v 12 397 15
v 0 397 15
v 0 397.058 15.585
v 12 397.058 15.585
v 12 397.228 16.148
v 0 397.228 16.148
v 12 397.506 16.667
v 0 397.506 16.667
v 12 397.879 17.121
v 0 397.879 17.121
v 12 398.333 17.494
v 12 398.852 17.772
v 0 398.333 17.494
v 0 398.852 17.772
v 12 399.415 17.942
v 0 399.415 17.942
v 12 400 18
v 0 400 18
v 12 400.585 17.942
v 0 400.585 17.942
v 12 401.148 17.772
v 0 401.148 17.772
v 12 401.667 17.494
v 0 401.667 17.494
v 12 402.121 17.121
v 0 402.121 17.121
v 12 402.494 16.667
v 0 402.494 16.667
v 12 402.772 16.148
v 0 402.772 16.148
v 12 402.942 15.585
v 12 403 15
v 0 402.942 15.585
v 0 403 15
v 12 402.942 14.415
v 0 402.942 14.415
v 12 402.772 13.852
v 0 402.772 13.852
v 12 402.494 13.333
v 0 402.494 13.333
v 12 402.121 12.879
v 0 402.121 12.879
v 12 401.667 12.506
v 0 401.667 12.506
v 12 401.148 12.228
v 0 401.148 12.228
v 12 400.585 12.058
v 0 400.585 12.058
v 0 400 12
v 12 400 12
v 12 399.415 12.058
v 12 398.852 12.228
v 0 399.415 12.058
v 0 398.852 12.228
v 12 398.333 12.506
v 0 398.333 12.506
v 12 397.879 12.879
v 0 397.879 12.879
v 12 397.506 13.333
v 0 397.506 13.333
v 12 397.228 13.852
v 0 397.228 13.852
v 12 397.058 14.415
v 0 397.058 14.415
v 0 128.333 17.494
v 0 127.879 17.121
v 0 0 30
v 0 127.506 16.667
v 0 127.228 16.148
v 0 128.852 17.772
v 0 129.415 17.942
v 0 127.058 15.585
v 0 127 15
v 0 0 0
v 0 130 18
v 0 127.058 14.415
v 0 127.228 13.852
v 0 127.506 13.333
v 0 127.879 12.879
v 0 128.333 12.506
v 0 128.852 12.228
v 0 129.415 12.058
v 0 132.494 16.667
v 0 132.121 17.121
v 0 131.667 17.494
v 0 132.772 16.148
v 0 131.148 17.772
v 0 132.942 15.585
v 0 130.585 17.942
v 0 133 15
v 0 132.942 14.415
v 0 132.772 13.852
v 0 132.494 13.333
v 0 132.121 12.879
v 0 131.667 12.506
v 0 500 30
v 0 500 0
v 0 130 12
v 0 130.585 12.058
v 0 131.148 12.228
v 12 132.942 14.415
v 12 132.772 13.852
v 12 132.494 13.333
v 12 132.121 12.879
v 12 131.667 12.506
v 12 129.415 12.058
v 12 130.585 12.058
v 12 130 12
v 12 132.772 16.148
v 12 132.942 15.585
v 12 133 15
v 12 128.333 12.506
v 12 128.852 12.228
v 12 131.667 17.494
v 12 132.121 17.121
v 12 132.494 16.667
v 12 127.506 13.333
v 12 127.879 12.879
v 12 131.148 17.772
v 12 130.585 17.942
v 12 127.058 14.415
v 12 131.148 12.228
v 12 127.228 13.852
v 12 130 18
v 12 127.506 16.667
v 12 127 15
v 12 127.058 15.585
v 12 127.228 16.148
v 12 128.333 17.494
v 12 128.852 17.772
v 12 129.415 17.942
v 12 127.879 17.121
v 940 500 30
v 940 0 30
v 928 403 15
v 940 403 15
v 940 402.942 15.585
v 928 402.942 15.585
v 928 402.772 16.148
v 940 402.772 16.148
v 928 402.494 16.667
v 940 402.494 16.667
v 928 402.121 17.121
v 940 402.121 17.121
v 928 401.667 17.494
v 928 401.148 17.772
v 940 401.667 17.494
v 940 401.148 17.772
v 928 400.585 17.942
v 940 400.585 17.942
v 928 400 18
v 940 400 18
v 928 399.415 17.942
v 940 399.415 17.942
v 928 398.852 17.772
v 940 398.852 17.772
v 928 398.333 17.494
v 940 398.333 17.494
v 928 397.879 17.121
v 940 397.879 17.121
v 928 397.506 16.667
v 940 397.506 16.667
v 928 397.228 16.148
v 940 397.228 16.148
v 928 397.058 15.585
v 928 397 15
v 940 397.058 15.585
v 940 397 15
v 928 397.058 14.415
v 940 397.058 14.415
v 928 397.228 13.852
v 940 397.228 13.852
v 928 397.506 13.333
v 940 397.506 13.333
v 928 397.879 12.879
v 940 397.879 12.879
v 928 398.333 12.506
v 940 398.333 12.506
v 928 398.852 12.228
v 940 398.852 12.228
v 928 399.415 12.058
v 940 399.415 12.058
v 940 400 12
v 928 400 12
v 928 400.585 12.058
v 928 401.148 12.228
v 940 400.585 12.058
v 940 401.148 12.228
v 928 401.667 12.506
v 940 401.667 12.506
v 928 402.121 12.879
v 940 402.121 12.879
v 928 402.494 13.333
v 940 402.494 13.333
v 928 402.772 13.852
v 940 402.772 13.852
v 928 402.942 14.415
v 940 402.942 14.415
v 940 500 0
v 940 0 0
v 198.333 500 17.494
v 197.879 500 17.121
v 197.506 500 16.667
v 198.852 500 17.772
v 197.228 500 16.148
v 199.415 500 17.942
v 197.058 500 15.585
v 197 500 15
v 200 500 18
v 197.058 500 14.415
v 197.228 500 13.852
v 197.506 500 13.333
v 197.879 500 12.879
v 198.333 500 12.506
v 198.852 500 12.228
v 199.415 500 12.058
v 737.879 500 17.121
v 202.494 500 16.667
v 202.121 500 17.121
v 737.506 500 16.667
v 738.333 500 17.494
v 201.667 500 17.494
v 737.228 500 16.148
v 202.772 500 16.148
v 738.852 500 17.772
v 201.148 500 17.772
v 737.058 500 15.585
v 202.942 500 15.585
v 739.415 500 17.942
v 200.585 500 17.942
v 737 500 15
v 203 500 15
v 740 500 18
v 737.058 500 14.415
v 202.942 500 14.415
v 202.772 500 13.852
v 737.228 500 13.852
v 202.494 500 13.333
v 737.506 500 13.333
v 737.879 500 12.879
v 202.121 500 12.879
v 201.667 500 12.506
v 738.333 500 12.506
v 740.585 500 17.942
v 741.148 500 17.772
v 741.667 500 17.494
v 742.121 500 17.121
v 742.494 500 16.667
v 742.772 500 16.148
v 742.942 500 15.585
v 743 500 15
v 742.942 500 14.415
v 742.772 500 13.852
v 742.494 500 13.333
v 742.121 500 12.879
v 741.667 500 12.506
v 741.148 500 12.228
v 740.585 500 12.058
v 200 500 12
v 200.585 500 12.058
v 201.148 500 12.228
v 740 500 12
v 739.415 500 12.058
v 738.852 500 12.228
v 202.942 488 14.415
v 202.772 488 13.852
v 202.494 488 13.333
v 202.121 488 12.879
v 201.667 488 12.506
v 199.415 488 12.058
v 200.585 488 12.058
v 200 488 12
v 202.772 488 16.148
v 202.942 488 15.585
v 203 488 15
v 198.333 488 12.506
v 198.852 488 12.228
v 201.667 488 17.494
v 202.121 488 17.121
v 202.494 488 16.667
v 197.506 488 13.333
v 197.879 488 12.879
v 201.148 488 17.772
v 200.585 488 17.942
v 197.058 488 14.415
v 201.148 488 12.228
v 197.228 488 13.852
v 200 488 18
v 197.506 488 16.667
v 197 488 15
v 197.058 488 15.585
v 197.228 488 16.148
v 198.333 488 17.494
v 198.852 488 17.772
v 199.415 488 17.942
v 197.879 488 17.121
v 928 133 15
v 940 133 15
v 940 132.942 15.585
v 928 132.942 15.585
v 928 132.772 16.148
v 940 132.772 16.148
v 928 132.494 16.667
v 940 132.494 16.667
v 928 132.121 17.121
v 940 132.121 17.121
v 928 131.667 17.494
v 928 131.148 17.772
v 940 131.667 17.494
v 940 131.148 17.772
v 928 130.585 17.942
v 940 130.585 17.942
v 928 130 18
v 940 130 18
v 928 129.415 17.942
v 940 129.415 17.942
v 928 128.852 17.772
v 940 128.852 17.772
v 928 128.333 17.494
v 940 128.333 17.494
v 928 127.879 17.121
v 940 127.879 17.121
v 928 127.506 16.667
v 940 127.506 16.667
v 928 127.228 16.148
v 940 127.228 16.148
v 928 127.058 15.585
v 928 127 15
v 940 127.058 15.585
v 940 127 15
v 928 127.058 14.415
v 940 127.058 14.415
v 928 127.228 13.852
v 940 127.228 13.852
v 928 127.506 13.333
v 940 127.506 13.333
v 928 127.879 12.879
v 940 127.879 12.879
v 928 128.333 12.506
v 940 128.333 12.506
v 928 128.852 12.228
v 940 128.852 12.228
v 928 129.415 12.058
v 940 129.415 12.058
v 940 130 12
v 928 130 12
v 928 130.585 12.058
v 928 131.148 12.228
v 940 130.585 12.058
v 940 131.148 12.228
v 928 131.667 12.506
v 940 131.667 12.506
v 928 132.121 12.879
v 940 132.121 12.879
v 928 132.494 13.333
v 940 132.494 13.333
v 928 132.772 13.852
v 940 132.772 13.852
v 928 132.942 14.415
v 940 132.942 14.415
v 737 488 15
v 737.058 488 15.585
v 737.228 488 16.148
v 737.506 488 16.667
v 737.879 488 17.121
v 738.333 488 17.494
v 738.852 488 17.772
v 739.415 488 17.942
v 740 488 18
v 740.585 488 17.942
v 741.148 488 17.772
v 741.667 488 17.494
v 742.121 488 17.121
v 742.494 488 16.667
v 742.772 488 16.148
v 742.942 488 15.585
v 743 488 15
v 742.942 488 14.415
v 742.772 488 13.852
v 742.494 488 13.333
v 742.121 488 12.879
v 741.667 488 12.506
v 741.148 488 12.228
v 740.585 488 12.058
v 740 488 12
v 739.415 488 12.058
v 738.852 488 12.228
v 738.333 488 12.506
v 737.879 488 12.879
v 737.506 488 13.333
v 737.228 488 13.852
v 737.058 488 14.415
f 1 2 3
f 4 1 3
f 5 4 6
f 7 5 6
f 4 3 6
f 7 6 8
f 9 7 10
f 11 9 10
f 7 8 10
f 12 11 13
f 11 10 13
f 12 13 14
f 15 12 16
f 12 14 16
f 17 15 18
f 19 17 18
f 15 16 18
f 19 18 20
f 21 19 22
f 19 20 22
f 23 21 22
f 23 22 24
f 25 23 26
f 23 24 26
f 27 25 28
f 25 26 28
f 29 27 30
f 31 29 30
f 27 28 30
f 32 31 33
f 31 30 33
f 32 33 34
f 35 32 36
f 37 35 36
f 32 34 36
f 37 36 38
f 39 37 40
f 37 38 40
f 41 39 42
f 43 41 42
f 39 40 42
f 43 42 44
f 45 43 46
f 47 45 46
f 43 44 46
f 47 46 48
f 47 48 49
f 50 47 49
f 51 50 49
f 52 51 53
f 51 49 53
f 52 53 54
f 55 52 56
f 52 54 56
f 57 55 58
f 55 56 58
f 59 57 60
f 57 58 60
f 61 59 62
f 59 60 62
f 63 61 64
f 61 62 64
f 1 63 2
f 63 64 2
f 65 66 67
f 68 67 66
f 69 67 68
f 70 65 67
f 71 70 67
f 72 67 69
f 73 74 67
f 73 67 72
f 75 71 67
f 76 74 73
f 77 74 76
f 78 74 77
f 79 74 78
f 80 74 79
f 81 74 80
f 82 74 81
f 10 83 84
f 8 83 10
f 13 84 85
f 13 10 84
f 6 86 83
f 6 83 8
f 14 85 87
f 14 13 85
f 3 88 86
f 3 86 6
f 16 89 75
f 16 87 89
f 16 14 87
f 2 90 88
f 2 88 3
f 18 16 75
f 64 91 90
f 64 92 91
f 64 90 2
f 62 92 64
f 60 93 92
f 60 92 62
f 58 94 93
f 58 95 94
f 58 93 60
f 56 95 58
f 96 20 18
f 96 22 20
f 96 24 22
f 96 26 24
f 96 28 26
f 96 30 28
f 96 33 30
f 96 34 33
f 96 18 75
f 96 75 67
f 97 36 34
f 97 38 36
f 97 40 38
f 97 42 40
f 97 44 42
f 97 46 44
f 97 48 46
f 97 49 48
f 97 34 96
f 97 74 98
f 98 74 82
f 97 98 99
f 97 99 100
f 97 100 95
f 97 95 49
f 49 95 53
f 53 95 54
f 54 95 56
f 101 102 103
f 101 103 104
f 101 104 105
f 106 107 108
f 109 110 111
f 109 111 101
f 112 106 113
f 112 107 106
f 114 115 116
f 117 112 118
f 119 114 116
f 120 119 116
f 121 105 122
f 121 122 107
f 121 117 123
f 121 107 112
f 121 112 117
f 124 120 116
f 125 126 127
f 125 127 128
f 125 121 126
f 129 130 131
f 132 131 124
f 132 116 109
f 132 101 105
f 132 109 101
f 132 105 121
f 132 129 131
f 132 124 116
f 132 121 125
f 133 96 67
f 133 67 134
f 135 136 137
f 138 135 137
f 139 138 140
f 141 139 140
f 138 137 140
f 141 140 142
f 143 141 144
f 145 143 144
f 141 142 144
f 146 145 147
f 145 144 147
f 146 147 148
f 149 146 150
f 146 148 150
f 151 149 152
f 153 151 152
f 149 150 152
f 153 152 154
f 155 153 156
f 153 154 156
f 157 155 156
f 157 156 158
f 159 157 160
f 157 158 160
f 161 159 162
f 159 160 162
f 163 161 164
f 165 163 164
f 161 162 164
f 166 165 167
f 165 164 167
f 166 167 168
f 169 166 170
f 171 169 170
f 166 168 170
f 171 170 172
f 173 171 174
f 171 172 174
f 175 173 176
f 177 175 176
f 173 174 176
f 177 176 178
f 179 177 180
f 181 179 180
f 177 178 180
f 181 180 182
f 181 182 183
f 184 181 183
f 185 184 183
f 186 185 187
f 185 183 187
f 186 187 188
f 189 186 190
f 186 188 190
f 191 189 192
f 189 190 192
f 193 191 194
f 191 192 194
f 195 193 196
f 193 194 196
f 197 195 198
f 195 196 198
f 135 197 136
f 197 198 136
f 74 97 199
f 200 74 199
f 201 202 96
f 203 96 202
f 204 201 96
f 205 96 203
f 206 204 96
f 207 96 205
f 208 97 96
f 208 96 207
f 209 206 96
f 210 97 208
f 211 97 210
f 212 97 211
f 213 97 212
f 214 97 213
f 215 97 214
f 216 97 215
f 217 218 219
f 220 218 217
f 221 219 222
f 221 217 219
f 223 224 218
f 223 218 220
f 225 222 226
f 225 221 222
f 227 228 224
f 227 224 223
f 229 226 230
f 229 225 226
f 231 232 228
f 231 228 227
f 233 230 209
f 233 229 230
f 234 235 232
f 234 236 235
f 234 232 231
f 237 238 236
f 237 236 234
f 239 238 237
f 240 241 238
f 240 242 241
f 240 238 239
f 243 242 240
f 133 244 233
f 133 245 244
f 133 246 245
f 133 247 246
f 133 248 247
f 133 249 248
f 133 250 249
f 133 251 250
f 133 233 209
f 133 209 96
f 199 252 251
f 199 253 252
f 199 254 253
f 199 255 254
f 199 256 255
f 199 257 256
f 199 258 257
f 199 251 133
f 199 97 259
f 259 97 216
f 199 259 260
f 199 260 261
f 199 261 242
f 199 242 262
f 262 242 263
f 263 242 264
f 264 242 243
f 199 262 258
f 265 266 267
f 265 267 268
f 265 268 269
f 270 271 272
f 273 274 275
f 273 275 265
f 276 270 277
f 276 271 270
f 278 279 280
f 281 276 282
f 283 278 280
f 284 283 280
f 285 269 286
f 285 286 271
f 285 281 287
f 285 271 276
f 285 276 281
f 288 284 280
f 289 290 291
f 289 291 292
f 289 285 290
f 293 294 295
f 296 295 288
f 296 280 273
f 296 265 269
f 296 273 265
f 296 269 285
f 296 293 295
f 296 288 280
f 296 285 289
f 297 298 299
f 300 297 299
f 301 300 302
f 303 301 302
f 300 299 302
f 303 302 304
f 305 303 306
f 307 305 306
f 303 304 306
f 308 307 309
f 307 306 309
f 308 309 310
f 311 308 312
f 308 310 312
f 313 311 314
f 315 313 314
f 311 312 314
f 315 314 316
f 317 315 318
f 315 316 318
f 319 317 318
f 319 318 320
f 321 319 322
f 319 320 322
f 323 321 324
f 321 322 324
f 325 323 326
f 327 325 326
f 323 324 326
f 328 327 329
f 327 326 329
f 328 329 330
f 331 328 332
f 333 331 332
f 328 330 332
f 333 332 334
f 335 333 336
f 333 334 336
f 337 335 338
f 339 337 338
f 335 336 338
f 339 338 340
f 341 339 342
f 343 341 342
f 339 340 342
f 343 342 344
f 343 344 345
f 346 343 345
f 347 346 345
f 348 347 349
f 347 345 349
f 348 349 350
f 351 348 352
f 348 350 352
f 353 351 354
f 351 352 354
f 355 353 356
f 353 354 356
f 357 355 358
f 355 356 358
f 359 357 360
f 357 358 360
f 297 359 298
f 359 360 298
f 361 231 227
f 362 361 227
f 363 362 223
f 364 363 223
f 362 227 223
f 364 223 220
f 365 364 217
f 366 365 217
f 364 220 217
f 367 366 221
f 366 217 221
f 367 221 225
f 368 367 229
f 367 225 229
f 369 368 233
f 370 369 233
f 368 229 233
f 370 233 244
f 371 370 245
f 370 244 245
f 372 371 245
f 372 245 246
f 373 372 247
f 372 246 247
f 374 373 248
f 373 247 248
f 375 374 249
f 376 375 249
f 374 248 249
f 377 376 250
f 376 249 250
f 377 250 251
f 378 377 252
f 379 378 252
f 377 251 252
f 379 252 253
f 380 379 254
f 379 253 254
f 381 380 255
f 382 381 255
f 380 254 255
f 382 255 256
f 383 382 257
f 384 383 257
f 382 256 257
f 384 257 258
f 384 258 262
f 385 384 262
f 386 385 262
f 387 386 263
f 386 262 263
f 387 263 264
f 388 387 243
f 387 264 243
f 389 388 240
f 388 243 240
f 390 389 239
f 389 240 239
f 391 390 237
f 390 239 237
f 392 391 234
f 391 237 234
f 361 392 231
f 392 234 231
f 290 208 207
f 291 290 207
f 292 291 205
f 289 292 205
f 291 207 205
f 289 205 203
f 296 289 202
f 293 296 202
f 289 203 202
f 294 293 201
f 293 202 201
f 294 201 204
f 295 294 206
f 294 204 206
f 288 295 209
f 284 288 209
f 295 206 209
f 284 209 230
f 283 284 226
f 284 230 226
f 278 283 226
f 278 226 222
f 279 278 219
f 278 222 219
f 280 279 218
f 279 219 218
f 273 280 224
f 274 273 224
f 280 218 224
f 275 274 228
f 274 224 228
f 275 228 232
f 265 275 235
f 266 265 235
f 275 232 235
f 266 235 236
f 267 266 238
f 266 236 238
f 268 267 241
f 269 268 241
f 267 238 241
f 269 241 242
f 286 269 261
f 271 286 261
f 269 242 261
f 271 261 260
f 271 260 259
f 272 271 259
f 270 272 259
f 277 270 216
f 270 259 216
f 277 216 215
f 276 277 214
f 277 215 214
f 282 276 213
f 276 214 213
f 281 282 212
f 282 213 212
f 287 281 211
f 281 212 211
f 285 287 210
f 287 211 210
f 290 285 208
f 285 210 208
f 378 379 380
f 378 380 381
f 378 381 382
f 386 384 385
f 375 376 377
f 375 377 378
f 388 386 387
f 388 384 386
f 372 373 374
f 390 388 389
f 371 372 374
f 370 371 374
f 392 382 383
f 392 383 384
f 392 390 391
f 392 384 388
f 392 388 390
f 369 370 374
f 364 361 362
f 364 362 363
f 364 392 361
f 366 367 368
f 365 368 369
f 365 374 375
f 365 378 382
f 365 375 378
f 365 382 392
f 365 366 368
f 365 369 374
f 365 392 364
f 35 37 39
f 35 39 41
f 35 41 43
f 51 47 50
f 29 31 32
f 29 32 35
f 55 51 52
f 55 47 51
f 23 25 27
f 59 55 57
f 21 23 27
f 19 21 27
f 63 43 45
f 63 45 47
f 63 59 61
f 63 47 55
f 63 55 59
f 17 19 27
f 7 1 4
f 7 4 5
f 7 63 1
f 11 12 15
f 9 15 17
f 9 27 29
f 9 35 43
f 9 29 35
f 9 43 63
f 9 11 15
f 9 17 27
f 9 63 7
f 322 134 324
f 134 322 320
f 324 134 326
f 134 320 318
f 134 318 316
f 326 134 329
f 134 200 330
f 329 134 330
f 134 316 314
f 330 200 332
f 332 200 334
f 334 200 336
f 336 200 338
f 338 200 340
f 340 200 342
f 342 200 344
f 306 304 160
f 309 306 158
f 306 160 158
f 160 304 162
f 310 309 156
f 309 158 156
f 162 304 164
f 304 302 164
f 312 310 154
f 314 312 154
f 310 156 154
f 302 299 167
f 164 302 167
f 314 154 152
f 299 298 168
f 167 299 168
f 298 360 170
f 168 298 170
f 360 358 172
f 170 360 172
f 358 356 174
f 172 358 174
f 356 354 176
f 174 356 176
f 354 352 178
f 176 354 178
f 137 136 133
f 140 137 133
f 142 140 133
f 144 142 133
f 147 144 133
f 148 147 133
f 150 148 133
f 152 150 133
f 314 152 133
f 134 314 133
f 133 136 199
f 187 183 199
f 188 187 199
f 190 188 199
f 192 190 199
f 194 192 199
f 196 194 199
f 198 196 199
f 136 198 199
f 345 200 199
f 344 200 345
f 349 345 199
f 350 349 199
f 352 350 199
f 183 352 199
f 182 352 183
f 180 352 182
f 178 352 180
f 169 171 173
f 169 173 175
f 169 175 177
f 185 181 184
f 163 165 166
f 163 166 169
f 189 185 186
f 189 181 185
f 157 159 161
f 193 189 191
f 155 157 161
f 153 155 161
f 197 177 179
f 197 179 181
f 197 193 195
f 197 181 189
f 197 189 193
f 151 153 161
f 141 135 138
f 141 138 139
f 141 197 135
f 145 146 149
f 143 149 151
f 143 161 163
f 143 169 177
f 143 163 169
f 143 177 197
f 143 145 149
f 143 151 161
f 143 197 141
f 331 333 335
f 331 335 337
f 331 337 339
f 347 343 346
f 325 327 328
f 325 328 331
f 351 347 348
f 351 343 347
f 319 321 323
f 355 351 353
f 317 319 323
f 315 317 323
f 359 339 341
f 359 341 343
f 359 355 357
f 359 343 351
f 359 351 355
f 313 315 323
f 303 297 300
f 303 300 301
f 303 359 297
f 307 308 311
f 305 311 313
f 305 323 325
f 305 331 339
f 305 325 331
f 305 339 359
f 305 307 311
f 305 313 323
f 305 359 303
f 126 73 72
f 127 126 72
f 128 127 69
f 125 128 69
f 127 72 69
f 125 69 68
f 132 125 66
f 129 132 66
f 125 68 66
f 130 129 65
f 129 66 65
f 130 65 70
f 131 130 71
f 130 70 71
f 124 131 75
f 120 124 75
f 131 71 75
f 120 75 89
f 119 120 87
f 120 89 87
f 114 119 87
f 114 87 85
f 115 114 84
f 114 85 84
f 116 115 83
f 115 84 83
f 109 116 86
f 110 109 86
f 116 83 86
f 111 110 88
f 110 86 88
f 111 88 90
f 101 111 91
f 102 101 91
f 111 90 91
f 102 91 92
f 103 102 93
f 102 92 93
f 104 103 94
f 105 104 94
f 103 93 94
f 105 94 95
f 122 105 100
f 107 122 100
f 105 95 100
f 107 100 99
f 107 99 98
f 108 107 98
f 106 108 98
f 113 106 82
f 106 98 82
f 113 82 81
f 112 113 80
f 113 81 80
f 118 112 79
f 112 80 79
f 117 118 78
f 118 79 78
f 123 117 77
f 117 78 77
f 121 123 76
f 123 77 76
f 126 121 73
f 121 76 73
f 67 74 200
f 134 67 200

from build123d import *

# Parameters (mm, degrees)
F0_W      = 940
F0_H      = 500
F1_DEPTH  = 30
F2_R      = 3
F3_DEPTH  = 12
F4_R      = 3
F5_DEPTH  = 12
F6_R      = 3
F7_DEPTH  = 12
F8_R      = 3
F9_DEPTH  = 12
F10_R     = 3
F11_DEPTH = 12


with BuildPart() as f1:
    # F0 (on Top) → F1 (new body)
    with BuildSketch(Plane.XY):
        with Locations((470, 250)):
            Rectangle(F0_W, F0_H)
    extrude(amount=F1_DEPTH)

    # F2 (on face) → F3 (cut)
    with BuildSketch(Plane.YZ.offset(940)):
        with Locations((130, 15)):
            Circle(F2_R)
    extrude(amount=-F3_DEPTH, mode=Mode.SUBTRACT)

    # F4 (on face) → F5 (cut)
    with BuildSketch(Plane.YZ.offset(940)):
        with Locations((400, 15)):
            Circle(F4_R)
    extrude(amount=-F5_DEPTH, mode=Mode.SUBTRACT)

    # F6 (on face) → F7 (cut)
    with BuildSketch(Plane(origin=(0, 0, 0), x_dir=(0, -1, 0), z_dir=(-1, 0, 0))):
        with Locations((-400, 15)):
            Circle(F6_R)
    extrude(amount=-F7_DEPTH, mode=Mode.SUBTRACT)

    # F8 (on face) → F9 (cut)
    with BuildSketch(Plane(origin=(0, 0, 0), x_dir=(0, -1, 0), z_dir=(-1, 0, 0))):
        with Locations((-130, 15)):
            Circle(F8_R)
    extrude(amount=-F9_DEPTH, mode=Mode.SUBTRACT)

    # F10 (on face) → F11 (cut)
    with BuildSketch(Plane(origin=(0, 500, 0), x_dir=(-1, 0, 0), z_dir=(0, 1, 0))):
        with Locations((-740, 15)):
            Circle(F10_R)
        with Locations((-200, 15)):
            Circle(F10_R)
    extrude(amount=-F11_DEPTH, mode=Mode.SUBTRACT)


solid = f1.part
